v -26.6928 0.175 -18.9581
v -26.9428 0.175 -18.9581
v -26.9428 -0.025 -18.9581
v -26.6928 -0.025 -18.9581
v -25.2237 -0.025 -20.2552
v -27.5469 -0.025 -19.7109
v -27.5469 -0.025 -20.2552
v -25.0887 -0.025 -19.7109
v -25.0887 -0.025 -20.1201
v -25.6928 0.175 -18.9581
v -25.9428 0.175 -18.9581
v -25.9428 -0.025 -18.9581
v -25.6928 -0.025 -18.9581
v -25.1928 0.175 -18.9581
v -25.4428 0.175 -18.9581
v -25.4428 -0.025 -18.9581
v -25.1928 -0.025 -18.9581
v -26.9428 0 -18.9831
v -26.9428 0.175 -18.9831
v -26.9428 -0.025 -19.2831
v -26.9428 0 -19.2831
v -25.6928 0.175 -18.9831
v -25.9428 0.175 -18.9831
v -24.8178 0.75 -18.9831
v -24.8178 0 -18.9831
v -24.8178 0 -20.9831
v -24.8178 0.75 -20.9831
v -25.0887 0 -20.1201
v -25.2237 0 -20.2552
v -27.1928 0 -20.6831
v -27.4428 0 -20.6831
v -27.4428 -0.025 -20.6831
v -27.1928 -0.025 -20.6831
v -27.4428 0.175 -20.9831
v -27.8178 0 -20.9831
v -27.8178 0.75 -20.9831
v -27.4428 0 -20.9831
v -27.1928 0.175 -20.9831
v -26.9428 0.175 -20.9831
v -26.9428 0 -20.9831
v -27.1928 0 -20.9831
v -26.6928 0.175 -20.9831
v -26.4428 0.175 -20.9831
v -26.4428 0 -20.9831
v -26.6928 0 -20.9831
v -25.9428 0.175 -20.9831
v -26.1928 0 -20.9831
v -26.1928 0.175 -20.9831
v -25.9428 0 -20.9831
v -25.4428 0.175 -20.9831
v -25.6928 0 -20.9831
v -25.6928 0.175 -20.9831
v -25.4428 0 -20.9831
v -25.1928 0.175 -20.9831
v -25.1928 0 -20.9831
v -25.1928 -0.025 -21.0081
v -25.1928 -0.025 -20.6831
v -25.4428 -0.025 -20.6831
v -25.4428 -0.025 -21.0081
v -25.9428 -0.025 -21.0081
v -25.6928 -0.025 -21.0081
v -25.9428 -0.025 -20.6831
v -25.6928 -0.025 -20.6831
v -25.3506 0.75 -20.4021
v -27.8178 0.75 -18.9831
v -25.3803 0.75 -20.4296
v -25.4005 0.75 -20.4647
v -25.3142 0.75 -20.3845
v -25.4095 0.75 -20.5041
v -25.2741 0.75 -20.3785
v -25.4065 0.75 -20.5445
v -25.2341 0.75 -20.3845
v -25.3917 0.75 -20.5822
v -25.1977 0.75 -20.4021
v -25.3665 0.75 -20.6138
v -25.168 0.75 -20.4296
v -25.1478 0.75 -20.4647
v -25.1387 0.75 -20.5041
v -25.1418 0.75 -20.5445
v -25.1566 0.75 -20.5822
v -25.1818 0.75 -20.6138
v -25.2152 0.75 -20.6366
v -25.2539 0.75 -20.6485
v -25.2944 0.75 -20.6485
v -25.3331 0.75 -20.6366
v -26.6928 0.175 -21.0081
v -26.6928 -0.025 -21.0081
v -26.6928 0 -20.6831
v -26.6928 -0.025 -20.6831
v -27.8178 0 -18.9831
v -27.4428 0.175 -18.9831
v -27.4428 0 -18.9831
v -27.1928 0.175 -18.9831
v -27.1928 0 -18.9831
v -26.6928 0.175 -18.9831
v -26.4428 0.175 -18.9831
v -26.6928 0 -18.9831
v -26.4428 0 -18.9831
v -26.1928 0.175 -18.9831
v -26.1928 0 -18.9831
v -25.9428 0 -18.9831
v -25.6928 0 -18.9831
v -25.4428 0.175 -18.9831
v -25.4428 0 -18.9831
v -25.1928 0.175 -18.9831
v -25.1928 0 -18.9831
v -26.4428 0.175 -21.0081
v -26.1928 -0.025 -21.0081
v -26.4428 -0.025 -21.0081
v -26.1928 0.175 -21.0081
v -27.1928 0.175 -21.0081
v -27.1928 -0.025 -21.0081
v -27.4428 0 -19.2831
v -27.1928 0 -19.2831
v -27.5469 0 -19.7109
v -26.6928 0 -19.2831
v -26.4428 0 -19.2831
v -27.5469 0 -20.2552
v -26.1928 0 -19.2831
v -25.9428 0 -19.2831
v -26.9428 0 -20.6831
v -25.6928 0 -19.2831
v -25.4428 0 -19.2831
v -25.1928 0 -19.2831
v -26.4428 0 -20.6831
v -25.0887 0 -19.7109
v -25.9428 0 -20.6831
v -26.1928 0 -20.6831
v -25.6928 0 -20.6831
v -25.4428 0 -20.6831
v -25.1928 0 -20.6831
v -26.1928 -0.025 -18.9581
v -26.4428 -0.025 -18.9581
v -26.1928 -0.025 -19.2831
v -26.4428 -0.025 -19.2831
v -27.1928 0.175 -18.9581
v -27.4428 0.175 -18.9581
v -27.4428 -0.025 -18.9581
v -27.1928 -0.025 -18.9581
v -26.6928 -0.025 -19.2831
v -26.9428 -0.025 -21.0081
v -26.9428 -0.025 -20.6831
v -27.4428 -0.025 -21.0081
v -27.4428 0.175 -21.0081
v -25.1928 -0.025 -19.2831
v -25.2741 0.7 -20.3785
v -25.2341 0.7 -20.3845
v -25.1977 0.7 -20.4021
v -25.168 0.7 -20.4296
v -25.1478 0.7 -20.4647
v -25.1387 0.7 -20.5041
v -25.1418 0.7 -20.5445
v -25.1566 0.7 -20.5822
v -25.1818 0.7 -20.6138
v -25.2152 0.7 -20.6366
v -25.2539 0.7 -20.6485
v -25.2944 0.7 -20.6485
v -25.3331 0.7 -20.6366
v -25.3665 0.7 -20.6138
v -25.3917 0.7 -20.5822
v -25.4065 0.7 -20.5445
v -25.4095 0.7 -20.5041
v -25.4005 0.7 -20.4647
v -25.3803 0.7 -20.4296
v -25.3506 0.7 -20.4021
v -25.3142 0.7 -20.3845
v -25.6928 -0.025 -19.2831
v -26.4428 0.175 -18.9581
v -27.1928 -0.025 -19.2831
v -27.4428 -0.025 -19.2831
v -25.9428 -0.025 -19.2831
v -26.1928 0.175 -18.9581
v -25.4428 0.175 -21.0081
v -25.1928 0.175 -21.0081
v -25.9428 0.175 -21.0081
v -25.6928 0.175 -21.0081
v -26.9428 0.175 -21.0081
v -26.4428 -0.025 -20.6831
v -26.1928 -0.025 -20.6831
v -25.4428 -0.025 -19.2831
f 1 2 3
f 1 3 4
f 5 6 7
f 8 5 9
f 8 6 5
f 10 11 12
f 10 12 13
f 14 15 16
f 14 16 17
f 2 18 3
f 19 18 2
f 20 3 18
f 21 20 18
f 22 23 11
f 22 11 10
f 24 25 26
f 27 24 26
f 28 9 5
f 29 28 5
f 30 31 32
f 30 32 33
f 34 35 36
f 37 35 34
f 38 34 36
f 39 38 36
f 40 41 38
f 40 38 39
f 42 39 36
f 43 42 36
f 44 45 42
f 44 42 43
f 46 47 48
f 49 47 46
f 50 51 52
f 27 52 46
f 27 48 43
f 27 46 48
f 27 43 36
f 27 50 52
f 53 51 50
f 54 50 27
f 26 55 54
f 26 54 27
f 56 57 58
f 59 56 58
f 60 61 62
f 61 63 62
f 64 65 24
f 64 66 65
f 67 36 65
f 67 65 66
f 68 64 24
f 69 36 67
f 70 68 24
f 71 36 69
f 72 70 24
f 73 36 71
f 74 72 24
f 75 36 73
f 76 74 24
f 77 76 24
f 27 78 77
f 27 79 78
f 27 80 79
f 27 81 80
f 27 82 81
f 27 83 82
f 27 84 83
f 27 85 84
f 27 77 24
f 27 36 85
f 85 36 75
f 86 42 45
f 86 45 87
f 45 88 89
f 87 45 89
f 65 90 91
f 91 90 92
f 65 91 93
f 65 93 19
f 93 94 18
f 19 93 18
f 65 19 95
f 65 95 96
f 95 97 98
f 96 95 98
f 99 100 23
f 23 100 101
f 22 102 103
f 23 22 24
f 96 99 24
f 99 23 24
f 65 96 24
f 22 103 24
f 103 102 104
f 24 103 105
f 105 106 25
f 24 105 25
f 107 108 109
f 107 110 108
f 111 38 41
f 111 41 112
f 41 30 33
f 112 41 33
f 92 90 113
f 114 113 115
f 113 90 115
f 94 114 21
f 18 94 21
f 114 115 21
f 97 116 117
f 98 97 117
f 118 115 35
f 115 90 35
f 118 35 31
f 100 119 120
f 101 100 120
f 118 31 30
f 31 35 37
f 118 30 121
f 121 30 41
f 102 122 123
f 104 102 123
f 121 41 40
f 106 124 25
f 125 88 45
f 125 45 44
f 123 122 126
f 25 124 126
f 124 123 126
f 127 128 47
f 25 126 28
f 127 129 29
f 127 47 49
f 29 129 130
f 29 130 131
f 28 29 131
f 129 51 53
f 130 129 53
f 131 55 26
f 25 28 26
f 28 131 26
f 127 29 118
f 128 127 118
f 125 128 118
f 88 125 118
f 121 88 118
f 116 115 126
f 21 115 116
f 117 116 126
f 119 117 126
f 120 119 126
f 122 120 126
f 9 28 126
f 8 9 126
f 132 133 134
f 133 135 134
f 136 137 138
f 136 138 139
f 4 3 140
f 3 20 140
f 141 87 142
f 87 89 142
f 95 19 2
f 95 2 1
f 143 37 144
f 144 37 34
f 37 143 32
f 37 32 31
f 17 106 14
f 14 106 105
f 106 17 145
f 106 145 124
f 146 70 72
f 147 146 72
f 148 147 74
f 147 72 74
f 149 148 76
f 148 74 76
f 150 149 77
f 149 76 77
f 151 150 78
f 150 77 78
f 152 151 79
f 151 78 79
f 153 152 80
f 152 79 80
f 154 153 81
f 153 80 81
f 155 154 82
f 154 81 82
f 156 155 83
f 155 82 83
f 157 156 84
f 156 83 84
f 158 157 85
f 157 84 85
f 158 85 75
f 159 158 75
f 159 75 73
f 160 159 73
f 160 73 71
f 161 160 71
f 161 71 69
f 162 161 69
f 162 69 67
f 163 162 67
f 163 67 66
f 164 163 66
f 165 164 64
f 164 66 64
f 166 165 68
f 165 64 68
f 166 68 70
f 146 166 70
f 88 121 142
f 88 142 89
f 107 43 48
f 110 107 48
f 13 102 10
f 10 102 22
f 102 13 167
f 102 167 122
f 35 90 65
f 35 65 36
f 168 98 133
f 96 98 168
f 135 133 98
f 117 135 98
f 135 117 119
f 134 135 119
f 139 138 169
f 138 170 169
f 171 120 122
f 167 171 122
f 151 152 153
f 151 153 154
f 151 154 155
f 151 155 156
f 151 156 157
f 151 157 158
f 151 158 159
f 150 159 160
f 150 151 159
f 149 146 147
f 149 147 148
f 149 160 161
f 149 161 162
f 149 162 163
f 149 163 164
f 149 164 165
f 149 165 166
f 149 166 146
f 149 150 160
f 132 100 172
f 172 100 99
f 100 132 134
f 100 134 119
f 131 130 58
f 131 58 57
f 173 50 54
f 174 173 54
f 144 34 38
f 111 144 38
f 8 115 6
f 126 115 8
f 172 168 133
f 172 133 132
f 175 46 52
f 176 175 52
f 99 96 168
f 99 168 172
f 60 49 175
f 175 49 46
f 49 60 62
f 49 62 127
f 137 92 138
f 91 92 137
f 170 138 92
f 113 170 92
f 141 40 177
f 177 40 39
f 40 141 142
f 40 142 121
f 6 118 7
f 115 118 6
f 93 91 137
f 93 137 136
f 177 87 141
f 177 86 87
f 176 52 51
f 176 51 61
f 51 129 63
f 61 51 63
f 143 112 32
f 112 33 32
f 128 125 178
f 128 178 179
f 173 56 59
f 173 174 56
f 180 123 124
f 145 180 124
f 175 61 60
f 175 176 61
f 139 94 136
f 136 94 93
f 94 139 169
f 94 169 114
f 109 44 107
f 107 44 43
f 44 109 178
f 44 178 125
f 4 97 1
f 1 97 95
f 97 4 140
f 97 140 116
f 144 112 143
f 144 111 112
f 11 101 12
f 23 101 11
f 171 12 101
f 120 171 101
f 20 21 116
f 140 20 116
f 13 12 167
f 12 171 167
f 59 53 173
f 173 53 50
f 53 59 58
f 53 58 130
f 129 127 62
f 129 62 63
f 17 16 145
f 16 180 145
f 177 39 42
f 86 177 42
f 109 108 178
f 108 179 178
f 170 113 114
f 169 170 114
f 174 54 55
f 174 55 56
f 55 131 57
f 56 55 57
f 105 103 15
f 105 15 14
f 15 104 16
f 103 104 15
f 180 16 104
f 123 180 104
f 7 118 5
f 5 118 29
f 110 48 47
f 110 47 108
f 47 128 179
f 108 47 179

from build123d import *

# Parameters (mm, degrees)
SKETCH1_W           = 3
SKETCH1_H           = 2
BOSS_EXTRUDE1_DEPTH = 0.75
SKETCH2_W           = 0.25
SKETCH2_H           = 0.3
SKETCH2_W_2         = 2.458211199
SKETCH2_H_2         = 0.544287264
BOSS_EXTRUDE2_DEPTH = 0.025
CUT_EXTRUDE1_DEPTH  = 0.025
SKETCH8_W           = 0.25
SKETCH8_H           = 0.2
BOSS_EXTRUDE3_DEPTH = 0.025
BOSS_EXTRUDE4_DEPTH = 0.025
SKETCH10_R          = 0.135779542
CUT_EXTRUDE2_DEPTH  = 0.05


with BuildPart() as part:
    # Sketch1 → Boss-Extrude1 (new body)
    with BuildSketch(Plane(origin=(0, 0, 0), x_dir=(1, 0, 0), z_dir=(0, 1, 0))):
        with Locations((-26.317781221, 19.983079484)):
            Rectangle(SKETCH1_W, SKETCH1_H)
    extrude(amount=BOSS_EXTRUDE1_DEPTH)

    # Sketch2 → Boss-Extrude2 (add)
    with BuildSketch(Plane.XZ):
        with Locations((-25.817781221, -20.833079484)):
            Rectangle(SKETCH2_W, SKETCH2_H)
        with Locations((-25.317781221, -20.833079484)):
            Rectangle(SKETCH2_W, SKETCH2_H)
        with Locations((-26.317781221, -20.833079484)):
            Rectangle(SKETCH2_W, SKETCH2_H)
        with Locations((-26.817781221, -20.833079484)):
            Rectangle(SKETCH2_W, SKETCH2_H)
        with Locations((-27.317781221, -20.833079484)):
            Rectangle(SKETCH2_W, SKETCH2_H)
        with Locations((-26.817781221, -19.133079484)):
            Rectangle(SKETCH2_W, SKETCH2_H)
        with Locations((-27.317781221, -19.133079484)):
            Rectangle(SKETCH2_W, SKETCH2_H)
        with Locations((-26.317781221, -19.133079484)):
            Rectangle(SKETCH2_W, SKETCH2_H)
        with Locations((-25.817781221, -19.133079484)):
            Rectangle(SKETCH2_W, SKETCH2_H)
        with Locations((-25.317781221, -19.133079484)):
            Rectangle(SKETCH2_W, SKETCH2_H)
        with Locations((-26.317781221, -19.983079484)):
            Rectangle(SKETCH2_W_2, SKETCH2_H_2)
    extrude(amount=BOSS_EXTRUDE2_DEPTH)

    # Sketch3 → Cut-Extrude1 (cut)
    with BuildSketch(Plane(origin=(0, -0.025, 0), x_dir=(-1, 0, 0), z_dir=(0, -1, 0))):
        Polygon((25.088675621, 20.12010835), (25.223675621, 20.255223116), (25.088675621, 20.255223116), align=None)
    extrude(amount=-CUT_EXTRUDE1_DEPTH, mode=Mode.SUBTRACT)

    # Sketch8 → Boss-Extrude3 (add)
    with BuildSketch(Plane.XY.offset(-18.983079484)):
        with Locations((-27.317781221, 0.075)):
            Rectangle(SKETCH8_W, SKETCH8_H)
        with Locations((-26.817781221, 0.075)):
            Rectangle(SKETCH8_W, SKETCH8_H)
        with Locations((-26.317781221, 0.075)):
            Rectangle(SKETCH8_W, SKETCH8_H)
        with Locations((-25.817781221, 0.075)):
            Rectangle(SKETCH8_W, SKETCH8_H)
        with Locations((-25.317781221, 0.075)):
            Rectangle(SKETCH8_W, SKETCH8_H)
    extrude(amount=BOSS_EXTRUDE3_DEPTH)

    # Sketch5 → Boss-Extrude4 (add)
    with BuildSketch(Plane(origin=(0, 0, -20.983079484), x_dir=(-1, 0, 0), z_dir=(0, 0, -1))):
        Polygon((25.192781221, 0), (25.192781221, -0.025), (25.442781221, -0.025), (25.442781221, 0), (25.442781221, 0.175), (25.192781221, 0.175), align=None)
        Polygon((25.692781221, 0), (25.692781221, -0.025), (25.942781221, -0.025), (25.942781221, 0), (25.942781221, 0.175), (25.692781221, 0.175), align=None)
        Polygon((26.192781221, 0), (26.192781221, -0.025), (26.442781221, -0.025), (26.442781221, 0), (26.442781221, 0.175), (26.192781221, 0.175), align=None)
        Polygon((26.692781221, 0), (26.692781221, -0.025), (26.942781221, -0.025), (26.942781221, 0), (26.942781221, 0.175), (26.692781221, 0.175), align=None)
        Polygon((27.192781221, 0), (27.192781221, -0.025), (27.442781221, -0.025), (27.442781221, 0), (27.442781221, 0.175), (27.192781221, 0.175), align=None)
    extrude(amount=BOSS_EXTRUDE4_DEPTH)

    # Sketch10 → Cut-Extrude2 (cut)
    with BuildSketch(Plane(origin=(0, 0.75, 0), x_dir=(1, 0, 0), z_dir=(0, 1, 0))):
        with Locations(Location((-25.274148522, 20.514267266, 0), (0, 0, 270))):
            Circle(SKETCH10_R)
    extrude(amount=-CUT_EXTRUDE2_DEPTH, mode=Mode.SUBTRACT)


solid = part.part
